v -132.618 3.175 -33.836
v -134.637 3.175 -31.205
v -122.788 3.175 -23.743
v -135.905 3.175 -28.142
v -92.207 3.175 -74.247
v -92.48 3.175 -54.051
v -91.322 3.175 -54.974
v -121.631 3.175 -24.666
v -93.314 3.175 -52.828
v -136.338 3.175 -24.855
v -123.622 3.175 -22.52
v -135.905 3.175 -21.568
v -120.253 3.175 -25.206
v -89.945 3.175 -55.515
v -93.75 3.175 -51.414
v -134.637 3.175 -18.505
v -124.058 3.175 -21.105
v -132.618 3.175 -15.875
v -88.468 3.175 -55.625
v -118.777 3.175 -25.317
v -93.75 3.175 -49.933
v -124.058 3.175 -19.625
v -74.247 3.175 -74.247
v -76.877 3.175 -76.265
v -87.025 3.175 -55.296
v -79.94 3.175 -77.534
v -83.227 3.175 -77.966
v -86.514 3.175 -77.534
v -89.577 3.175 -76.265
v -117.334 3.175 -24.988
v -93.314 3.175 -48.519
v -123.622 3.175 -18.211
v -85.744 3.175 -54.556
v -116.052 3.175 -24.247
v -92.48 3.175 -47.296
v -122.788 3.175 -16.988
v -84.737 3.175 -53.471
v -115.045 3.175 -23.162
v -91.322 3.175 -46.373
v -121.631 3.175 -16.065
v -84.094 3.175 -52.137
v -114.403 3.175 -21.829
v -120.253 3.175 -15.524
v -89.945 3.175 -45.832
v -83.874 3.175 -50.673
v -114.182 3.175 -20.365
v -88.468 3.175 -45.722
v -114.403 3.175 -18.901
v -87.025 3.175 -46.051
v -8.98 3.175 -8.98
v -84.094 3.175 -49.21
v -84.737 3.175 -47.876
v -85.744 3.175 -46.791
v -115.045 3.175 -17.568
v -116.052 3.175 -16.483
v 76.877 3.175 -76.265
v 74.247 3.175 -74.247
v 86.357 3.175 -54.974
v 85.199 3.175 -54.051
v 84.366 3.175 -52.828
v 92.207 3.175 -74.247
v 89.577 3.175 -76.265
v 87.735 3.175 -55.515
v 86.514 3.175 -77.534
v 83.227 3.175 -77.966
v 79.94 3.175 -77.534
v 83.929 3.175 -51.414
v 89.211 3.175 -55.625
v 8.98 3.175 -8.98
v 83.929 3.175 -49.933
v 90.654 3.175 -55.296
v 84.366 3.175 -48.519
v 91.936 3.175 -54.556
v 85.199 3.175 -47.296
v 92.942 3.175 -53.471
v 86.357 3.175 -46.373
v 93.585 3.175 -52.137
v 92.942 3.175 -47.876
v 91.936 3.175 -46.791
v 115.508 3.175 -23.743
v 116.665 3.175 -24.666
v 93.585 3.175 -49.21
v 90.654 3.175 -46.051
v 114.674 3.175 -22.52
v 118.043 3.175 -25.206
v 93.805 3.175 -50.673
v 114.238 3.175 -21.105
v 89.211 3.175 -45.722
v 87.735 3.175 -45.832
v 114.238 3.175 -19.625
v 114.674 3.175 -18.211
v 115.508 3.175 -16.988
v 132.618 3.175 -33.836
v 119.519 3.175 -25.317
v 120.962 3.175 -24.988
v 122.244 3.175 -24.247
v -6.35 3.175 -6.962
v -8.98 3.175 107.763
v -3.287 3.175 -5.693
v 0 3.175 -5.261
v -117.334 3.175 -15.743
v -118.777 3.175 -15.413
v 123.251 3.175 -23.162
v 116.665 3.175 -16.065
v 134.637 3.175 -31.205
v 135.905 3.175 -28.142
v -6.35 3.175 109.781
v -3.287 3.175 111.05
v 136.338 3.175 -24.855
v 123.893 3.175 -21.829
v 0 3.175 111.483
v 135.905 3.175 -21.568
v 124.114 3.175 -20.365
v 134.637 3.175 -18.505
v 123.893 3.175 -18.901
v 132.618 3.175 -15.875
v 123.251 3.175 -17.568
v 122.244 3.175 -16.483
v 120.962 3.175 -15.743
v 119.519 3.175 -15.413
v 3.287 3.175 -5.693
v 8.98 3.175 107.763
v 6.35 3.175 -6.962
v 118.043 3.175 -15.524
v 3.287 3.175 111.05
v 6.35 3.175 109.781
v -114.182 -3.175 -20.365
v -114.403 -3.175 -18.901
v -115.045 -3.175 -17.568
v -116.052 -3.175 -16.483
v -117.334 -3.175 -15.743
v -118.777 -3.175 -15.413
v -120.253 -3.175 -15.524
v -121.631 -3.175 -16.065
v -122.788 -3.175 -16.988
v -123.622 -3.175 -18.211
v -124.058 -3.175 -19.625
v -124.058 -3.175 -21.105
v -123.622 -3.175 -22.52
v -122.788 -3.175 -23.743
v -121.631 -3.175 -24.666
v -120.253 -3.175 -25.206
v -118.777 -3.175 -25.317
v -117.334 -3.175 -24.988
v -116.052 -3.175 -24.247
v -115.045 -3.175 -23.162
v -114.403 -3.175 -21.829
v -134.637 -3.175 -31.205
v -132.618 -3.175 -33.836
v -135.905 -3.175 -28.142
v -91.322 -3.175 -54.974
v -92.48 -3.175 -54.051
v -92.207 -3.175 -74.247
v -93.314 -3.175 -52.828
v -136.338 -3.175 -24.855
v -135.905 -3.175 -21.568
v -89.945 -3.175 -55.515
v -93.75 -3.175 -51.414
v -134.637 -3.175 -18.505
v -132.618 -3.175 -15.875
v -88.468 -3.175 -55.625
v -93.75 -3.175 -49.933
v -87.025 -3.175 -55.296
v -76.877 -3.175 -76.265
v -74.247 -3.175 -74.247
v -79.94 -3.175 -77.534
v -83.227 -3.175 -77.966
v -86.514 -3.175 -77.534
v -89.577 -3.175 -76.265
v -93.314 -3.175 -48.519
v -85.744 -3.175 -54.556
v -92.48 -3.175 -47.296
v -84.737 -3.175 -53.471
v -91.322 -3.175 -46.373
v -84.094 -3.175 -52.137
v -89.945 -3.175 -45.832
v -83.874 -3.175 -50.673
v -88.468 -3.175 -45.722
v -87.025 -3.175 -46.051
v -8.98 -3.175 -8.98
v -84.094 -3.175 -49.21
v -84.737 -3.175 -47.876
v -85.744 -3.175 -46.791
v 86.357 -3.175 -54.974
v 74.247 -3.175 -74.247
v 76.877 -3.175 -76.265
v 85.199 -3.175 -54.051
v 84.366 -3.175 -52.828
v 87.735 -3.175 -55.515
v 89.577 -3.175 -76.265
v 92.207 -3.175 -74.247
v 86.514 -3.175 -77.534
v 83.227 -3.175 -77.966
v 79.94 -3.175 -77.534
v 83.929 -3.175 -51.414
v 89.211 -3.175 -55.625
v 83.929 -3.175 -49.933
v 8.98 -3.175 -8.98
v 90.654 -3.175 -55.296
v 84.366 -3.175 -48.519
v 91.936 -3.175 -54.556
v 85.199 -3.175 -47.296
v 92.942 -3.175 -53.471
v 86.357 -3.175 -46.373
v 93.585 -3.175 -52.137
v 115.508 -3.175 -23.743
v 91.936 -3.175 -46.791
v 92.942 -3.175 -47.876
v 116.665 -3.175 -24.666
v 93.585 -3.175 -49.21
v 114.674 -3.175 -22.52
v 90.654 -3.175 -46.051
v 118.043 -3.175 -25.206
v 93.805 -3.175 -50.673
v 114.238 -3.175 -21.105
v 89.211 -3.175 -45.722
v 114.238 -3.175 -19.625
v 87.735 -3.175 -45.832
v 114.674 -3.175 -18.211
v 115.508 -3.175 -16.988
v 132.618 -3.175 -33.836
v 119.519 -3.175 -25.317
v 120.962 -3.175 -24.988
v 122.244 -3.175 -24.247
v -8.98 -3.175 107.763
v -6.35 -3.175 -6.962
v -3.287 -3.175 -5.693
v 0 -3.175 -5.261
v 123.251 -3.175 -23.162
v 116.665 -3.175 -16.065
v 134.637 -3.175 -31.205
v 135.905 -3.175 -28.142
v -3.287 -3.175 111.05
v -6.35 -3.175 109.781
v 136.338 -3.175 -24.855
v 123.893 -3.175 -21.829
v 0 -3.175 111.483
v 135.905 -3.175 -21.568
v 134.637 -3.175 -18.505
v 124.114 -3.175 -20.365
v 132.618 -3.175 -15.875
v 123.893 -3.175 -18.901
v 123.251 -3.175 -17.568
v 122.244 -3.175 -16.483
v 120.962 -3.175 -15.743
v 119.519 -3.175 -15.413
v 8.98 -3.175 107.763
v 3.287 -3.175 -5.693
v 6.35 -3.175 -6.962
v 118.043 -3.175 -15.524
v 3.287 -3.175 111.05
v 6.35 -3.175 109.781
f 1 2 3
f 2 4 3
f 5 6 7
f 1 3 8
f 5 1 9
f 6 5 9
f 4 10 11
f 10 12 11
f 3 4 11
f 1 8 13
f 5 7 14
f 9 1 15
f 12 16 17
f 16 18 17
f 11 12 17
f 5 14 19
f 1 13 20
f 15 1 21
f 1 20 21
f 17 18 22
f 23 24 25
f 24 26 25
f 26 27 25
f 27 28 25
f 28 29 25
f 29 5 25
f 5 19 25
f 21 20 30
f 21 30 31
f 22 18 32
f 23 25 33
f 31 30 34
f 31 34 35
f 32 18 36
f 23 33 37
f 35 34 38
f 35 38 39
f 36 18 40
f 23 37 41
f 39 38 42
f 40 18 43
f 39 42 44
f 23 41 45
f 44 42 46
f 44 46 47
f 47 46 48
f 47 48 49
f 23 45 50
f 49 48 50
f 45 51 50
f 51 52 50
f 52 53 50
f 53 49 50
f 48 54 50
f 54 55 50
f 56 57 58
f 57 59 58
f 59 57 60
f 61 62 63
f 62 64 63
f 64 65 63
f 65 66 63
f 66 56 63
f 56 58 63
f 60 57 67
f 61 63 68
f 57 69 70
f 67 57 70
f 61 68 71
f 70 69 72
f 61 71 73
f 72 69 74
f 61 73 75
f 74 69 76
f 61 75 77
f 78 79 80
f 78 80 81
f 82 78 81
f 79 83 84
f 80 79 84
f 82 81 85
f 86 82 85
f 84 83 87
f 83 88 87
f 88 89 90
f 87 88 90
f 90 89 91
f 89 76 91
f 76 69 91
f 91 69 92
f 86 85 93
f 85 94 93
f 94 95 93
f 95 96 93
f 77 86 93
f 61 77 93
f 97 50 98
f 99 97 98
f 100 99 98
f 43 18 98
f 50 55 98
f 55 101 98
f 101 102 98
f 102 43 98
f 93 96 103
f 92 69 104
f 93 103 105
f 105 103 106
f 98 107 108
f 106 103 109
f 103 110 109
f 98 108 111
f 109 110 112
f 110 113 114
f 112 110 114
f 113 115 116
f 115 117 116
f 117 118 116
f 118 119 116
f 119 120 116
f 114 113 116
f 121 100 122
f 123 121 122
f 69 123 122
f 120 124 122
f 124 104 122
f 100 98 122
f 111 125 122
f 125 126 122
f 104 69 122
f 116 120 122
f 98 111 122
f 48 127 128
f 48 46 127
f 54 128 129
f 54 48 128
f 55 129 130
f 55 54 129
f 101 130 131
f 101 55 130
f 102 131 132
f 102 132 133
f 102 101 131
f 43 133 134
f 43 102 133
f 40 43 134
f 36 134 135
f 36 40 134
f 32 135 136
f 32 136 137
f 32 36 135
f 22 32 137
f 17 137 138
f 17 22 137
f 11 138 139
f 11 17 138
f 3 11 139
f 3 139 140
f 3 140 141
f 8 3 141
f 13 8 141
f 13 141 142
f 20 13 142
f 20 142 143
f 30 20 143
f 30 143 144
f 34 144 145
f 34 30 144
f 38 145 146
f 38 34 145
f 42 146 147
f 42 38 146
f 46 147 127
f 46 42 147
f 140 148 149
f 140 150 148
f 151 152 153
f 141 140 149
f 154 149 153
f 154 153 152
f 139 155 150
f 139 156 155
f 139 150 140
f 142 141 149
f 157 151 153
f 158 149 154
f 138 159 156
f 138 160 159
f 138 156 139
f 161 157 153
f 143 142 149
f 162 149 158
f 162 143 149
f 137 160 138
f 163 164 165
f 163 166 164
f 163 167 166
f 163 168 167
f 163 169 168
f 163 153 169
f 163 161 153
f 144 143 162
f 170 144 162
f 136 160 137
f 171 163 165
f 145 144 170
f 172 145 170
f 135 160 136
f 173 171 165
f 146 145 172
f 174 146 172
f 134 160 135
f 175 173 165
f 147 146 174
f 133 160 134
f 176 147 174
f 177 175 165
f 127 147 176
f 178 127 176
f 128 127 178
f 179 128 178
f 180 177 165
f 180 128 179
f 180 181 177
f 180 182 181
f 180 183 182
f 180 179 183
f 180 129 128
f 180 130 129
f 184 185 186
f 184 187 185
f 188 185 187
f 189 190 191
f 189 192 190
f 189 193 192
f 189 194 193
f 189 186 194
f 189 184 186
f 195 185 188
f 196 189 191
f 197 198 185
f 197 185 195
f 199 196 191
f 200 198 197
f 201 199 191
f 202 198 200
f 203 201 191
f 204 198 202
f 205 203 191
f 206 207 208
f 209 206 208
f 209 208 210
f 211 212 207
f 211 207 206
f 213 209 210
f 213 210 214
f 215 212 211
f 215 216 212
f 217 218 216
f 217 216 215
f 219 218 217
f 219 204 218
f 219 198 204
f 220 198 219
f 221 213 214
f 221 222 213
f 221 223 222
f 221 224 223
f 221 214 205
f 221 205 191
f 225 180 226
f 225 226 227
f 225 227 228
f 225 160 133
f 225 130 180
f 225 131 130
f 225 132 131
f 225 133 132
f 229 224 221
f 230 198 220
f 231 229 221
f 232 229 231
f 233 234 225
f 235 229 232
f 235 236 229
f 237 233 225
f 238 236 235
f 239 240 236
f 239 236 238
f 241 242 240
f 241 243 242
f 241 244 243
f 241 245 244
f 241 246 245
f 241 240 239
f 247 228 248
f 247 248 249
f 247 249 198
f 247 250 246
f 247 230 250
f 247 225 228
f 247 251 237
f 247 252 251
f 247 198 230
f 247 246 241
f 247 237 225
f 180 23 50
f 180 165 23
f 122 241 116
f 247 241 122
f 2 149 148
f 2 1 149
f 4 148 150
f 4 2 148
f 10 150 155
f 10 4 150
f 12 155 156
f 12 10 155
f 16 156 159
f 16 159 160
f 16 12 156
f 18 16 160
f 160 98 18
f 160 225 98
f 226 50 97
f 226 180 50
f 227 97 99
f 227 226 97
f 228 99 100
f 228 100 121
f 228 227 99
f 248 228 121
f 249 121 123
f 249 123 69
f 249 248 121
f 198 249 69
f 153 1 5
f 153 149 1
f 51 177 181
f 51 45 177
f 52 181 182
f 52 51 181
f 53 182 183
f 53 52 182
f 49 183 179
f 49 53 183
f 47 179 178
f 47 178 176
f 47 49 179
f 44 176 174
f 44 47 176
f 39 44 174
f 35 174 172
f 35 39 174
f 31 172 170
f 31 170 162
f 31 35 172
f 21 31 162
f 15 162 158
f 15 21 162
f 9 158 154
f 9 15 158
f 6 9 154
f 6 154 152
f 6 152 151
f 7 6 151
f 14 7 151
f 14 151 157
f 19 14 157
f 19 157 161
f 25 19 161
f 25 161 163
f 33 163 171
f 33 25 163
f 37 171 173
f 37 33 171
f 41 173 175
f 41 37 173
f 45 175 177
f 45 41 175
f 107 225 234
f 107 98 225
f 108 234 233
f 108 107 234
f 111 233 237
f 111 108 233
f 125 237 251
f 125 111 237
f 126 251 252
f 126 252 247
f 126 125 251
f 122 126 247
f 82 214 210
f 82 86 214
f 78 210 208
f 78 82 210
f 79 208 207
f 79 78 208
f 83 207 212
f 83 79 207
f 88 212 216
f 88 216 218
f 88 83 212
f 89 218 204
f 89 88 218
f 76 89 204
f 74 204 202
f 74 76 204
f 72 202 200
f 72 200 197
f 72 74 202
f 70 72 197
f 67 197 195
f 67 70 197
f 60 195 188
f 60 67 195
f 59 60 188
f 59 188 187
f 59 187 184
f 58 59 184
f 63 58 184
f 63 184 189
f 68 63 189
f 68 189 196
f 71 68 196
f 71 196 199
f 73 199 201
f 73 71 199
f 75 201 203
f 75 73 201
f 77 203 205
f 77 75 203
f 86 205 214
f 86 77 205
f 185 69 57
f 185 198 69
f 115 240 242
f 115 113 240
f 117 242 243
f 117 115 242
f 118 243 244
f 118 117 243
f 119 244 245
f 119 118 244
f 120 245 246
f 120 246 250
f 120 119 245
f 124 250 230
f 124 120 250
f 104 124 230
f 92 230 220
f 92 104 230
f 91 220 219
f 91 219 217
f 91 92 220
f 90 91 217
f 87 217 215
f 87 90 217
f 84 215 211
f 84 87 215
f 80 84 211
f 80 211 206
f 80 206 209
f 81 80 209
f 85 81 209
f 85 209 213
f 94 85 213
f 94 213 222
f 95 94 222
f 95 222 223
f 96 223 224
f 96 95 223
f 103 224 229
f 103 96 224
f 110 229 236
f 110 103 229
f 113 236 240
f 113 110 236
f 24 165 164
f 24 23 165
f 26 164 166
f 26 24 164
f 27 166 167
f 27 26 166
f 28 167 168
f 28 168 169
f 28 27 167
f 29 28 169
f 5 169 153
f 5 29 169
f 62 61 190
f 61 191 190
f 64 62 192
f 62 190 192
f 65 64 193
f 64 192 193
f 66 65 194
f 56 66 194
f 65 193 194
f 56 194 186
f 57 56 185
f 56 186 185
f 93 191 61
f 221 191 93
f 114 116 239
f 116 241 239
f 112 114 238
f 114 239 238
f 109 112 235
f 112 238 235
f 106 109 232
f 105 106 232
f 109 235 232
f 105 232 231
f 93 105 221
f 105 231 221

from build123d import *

# Parameters (mm, degrees)
F0_R     = 4.9657
F1_DEPTH = 3.175
F2_R     = 12.7


with BuildPart() as f1:
    # F0 (on Front) → F1 (new body, symmetric)
    with BuildSketch(Plane.XZ):
        Polygon((-83.226920908, -83.226920908), (0, 0), (0, 4.1710244843), (0, 116.7433295739), (-141.598585695, -24.8552561211), align=None)
        with Locations((-88.8395809837, -50.6734924691)):
            Circle(F0_R, mode=Mode.SUBTRACT)
        with Locations((-119.1479453923, -20.3651280605)):
            Circle(F0_R, mode=Mode.SUBTRACT)
        Polygon((0, 4.1710244843), (0, 0), (83.226920908, -83.226920908), (141.598585695, -24.8552561211), (0, 116.7433295739), align=None)
        with Locations((88.8395809837, -50.6734924691)):
            Circle(F0_R, mode=Mode.SUBTRACT)
        with Locations((119.1479453923, -20.3651280605)):
            Circle(F0_R, mode=Mode.SUBTRACT)
    extrude(amount=F1_DEPTH, both=True)

    # F2
    f2_edges = [f1.edges().sort_by_distance(p)[0] for p in [
        (-141.598586, 0, -24.855256),
        (0, 0, 116.74333),
        (0, 0, 0),
        (83.226921, 0, -83.226921),
        (141.598586, 0, -24.855256),
        (-83.226921, 0, -83.226921),
    ]]
    fillet(f2_edges, radius=F2_R)


solid = f1.part
